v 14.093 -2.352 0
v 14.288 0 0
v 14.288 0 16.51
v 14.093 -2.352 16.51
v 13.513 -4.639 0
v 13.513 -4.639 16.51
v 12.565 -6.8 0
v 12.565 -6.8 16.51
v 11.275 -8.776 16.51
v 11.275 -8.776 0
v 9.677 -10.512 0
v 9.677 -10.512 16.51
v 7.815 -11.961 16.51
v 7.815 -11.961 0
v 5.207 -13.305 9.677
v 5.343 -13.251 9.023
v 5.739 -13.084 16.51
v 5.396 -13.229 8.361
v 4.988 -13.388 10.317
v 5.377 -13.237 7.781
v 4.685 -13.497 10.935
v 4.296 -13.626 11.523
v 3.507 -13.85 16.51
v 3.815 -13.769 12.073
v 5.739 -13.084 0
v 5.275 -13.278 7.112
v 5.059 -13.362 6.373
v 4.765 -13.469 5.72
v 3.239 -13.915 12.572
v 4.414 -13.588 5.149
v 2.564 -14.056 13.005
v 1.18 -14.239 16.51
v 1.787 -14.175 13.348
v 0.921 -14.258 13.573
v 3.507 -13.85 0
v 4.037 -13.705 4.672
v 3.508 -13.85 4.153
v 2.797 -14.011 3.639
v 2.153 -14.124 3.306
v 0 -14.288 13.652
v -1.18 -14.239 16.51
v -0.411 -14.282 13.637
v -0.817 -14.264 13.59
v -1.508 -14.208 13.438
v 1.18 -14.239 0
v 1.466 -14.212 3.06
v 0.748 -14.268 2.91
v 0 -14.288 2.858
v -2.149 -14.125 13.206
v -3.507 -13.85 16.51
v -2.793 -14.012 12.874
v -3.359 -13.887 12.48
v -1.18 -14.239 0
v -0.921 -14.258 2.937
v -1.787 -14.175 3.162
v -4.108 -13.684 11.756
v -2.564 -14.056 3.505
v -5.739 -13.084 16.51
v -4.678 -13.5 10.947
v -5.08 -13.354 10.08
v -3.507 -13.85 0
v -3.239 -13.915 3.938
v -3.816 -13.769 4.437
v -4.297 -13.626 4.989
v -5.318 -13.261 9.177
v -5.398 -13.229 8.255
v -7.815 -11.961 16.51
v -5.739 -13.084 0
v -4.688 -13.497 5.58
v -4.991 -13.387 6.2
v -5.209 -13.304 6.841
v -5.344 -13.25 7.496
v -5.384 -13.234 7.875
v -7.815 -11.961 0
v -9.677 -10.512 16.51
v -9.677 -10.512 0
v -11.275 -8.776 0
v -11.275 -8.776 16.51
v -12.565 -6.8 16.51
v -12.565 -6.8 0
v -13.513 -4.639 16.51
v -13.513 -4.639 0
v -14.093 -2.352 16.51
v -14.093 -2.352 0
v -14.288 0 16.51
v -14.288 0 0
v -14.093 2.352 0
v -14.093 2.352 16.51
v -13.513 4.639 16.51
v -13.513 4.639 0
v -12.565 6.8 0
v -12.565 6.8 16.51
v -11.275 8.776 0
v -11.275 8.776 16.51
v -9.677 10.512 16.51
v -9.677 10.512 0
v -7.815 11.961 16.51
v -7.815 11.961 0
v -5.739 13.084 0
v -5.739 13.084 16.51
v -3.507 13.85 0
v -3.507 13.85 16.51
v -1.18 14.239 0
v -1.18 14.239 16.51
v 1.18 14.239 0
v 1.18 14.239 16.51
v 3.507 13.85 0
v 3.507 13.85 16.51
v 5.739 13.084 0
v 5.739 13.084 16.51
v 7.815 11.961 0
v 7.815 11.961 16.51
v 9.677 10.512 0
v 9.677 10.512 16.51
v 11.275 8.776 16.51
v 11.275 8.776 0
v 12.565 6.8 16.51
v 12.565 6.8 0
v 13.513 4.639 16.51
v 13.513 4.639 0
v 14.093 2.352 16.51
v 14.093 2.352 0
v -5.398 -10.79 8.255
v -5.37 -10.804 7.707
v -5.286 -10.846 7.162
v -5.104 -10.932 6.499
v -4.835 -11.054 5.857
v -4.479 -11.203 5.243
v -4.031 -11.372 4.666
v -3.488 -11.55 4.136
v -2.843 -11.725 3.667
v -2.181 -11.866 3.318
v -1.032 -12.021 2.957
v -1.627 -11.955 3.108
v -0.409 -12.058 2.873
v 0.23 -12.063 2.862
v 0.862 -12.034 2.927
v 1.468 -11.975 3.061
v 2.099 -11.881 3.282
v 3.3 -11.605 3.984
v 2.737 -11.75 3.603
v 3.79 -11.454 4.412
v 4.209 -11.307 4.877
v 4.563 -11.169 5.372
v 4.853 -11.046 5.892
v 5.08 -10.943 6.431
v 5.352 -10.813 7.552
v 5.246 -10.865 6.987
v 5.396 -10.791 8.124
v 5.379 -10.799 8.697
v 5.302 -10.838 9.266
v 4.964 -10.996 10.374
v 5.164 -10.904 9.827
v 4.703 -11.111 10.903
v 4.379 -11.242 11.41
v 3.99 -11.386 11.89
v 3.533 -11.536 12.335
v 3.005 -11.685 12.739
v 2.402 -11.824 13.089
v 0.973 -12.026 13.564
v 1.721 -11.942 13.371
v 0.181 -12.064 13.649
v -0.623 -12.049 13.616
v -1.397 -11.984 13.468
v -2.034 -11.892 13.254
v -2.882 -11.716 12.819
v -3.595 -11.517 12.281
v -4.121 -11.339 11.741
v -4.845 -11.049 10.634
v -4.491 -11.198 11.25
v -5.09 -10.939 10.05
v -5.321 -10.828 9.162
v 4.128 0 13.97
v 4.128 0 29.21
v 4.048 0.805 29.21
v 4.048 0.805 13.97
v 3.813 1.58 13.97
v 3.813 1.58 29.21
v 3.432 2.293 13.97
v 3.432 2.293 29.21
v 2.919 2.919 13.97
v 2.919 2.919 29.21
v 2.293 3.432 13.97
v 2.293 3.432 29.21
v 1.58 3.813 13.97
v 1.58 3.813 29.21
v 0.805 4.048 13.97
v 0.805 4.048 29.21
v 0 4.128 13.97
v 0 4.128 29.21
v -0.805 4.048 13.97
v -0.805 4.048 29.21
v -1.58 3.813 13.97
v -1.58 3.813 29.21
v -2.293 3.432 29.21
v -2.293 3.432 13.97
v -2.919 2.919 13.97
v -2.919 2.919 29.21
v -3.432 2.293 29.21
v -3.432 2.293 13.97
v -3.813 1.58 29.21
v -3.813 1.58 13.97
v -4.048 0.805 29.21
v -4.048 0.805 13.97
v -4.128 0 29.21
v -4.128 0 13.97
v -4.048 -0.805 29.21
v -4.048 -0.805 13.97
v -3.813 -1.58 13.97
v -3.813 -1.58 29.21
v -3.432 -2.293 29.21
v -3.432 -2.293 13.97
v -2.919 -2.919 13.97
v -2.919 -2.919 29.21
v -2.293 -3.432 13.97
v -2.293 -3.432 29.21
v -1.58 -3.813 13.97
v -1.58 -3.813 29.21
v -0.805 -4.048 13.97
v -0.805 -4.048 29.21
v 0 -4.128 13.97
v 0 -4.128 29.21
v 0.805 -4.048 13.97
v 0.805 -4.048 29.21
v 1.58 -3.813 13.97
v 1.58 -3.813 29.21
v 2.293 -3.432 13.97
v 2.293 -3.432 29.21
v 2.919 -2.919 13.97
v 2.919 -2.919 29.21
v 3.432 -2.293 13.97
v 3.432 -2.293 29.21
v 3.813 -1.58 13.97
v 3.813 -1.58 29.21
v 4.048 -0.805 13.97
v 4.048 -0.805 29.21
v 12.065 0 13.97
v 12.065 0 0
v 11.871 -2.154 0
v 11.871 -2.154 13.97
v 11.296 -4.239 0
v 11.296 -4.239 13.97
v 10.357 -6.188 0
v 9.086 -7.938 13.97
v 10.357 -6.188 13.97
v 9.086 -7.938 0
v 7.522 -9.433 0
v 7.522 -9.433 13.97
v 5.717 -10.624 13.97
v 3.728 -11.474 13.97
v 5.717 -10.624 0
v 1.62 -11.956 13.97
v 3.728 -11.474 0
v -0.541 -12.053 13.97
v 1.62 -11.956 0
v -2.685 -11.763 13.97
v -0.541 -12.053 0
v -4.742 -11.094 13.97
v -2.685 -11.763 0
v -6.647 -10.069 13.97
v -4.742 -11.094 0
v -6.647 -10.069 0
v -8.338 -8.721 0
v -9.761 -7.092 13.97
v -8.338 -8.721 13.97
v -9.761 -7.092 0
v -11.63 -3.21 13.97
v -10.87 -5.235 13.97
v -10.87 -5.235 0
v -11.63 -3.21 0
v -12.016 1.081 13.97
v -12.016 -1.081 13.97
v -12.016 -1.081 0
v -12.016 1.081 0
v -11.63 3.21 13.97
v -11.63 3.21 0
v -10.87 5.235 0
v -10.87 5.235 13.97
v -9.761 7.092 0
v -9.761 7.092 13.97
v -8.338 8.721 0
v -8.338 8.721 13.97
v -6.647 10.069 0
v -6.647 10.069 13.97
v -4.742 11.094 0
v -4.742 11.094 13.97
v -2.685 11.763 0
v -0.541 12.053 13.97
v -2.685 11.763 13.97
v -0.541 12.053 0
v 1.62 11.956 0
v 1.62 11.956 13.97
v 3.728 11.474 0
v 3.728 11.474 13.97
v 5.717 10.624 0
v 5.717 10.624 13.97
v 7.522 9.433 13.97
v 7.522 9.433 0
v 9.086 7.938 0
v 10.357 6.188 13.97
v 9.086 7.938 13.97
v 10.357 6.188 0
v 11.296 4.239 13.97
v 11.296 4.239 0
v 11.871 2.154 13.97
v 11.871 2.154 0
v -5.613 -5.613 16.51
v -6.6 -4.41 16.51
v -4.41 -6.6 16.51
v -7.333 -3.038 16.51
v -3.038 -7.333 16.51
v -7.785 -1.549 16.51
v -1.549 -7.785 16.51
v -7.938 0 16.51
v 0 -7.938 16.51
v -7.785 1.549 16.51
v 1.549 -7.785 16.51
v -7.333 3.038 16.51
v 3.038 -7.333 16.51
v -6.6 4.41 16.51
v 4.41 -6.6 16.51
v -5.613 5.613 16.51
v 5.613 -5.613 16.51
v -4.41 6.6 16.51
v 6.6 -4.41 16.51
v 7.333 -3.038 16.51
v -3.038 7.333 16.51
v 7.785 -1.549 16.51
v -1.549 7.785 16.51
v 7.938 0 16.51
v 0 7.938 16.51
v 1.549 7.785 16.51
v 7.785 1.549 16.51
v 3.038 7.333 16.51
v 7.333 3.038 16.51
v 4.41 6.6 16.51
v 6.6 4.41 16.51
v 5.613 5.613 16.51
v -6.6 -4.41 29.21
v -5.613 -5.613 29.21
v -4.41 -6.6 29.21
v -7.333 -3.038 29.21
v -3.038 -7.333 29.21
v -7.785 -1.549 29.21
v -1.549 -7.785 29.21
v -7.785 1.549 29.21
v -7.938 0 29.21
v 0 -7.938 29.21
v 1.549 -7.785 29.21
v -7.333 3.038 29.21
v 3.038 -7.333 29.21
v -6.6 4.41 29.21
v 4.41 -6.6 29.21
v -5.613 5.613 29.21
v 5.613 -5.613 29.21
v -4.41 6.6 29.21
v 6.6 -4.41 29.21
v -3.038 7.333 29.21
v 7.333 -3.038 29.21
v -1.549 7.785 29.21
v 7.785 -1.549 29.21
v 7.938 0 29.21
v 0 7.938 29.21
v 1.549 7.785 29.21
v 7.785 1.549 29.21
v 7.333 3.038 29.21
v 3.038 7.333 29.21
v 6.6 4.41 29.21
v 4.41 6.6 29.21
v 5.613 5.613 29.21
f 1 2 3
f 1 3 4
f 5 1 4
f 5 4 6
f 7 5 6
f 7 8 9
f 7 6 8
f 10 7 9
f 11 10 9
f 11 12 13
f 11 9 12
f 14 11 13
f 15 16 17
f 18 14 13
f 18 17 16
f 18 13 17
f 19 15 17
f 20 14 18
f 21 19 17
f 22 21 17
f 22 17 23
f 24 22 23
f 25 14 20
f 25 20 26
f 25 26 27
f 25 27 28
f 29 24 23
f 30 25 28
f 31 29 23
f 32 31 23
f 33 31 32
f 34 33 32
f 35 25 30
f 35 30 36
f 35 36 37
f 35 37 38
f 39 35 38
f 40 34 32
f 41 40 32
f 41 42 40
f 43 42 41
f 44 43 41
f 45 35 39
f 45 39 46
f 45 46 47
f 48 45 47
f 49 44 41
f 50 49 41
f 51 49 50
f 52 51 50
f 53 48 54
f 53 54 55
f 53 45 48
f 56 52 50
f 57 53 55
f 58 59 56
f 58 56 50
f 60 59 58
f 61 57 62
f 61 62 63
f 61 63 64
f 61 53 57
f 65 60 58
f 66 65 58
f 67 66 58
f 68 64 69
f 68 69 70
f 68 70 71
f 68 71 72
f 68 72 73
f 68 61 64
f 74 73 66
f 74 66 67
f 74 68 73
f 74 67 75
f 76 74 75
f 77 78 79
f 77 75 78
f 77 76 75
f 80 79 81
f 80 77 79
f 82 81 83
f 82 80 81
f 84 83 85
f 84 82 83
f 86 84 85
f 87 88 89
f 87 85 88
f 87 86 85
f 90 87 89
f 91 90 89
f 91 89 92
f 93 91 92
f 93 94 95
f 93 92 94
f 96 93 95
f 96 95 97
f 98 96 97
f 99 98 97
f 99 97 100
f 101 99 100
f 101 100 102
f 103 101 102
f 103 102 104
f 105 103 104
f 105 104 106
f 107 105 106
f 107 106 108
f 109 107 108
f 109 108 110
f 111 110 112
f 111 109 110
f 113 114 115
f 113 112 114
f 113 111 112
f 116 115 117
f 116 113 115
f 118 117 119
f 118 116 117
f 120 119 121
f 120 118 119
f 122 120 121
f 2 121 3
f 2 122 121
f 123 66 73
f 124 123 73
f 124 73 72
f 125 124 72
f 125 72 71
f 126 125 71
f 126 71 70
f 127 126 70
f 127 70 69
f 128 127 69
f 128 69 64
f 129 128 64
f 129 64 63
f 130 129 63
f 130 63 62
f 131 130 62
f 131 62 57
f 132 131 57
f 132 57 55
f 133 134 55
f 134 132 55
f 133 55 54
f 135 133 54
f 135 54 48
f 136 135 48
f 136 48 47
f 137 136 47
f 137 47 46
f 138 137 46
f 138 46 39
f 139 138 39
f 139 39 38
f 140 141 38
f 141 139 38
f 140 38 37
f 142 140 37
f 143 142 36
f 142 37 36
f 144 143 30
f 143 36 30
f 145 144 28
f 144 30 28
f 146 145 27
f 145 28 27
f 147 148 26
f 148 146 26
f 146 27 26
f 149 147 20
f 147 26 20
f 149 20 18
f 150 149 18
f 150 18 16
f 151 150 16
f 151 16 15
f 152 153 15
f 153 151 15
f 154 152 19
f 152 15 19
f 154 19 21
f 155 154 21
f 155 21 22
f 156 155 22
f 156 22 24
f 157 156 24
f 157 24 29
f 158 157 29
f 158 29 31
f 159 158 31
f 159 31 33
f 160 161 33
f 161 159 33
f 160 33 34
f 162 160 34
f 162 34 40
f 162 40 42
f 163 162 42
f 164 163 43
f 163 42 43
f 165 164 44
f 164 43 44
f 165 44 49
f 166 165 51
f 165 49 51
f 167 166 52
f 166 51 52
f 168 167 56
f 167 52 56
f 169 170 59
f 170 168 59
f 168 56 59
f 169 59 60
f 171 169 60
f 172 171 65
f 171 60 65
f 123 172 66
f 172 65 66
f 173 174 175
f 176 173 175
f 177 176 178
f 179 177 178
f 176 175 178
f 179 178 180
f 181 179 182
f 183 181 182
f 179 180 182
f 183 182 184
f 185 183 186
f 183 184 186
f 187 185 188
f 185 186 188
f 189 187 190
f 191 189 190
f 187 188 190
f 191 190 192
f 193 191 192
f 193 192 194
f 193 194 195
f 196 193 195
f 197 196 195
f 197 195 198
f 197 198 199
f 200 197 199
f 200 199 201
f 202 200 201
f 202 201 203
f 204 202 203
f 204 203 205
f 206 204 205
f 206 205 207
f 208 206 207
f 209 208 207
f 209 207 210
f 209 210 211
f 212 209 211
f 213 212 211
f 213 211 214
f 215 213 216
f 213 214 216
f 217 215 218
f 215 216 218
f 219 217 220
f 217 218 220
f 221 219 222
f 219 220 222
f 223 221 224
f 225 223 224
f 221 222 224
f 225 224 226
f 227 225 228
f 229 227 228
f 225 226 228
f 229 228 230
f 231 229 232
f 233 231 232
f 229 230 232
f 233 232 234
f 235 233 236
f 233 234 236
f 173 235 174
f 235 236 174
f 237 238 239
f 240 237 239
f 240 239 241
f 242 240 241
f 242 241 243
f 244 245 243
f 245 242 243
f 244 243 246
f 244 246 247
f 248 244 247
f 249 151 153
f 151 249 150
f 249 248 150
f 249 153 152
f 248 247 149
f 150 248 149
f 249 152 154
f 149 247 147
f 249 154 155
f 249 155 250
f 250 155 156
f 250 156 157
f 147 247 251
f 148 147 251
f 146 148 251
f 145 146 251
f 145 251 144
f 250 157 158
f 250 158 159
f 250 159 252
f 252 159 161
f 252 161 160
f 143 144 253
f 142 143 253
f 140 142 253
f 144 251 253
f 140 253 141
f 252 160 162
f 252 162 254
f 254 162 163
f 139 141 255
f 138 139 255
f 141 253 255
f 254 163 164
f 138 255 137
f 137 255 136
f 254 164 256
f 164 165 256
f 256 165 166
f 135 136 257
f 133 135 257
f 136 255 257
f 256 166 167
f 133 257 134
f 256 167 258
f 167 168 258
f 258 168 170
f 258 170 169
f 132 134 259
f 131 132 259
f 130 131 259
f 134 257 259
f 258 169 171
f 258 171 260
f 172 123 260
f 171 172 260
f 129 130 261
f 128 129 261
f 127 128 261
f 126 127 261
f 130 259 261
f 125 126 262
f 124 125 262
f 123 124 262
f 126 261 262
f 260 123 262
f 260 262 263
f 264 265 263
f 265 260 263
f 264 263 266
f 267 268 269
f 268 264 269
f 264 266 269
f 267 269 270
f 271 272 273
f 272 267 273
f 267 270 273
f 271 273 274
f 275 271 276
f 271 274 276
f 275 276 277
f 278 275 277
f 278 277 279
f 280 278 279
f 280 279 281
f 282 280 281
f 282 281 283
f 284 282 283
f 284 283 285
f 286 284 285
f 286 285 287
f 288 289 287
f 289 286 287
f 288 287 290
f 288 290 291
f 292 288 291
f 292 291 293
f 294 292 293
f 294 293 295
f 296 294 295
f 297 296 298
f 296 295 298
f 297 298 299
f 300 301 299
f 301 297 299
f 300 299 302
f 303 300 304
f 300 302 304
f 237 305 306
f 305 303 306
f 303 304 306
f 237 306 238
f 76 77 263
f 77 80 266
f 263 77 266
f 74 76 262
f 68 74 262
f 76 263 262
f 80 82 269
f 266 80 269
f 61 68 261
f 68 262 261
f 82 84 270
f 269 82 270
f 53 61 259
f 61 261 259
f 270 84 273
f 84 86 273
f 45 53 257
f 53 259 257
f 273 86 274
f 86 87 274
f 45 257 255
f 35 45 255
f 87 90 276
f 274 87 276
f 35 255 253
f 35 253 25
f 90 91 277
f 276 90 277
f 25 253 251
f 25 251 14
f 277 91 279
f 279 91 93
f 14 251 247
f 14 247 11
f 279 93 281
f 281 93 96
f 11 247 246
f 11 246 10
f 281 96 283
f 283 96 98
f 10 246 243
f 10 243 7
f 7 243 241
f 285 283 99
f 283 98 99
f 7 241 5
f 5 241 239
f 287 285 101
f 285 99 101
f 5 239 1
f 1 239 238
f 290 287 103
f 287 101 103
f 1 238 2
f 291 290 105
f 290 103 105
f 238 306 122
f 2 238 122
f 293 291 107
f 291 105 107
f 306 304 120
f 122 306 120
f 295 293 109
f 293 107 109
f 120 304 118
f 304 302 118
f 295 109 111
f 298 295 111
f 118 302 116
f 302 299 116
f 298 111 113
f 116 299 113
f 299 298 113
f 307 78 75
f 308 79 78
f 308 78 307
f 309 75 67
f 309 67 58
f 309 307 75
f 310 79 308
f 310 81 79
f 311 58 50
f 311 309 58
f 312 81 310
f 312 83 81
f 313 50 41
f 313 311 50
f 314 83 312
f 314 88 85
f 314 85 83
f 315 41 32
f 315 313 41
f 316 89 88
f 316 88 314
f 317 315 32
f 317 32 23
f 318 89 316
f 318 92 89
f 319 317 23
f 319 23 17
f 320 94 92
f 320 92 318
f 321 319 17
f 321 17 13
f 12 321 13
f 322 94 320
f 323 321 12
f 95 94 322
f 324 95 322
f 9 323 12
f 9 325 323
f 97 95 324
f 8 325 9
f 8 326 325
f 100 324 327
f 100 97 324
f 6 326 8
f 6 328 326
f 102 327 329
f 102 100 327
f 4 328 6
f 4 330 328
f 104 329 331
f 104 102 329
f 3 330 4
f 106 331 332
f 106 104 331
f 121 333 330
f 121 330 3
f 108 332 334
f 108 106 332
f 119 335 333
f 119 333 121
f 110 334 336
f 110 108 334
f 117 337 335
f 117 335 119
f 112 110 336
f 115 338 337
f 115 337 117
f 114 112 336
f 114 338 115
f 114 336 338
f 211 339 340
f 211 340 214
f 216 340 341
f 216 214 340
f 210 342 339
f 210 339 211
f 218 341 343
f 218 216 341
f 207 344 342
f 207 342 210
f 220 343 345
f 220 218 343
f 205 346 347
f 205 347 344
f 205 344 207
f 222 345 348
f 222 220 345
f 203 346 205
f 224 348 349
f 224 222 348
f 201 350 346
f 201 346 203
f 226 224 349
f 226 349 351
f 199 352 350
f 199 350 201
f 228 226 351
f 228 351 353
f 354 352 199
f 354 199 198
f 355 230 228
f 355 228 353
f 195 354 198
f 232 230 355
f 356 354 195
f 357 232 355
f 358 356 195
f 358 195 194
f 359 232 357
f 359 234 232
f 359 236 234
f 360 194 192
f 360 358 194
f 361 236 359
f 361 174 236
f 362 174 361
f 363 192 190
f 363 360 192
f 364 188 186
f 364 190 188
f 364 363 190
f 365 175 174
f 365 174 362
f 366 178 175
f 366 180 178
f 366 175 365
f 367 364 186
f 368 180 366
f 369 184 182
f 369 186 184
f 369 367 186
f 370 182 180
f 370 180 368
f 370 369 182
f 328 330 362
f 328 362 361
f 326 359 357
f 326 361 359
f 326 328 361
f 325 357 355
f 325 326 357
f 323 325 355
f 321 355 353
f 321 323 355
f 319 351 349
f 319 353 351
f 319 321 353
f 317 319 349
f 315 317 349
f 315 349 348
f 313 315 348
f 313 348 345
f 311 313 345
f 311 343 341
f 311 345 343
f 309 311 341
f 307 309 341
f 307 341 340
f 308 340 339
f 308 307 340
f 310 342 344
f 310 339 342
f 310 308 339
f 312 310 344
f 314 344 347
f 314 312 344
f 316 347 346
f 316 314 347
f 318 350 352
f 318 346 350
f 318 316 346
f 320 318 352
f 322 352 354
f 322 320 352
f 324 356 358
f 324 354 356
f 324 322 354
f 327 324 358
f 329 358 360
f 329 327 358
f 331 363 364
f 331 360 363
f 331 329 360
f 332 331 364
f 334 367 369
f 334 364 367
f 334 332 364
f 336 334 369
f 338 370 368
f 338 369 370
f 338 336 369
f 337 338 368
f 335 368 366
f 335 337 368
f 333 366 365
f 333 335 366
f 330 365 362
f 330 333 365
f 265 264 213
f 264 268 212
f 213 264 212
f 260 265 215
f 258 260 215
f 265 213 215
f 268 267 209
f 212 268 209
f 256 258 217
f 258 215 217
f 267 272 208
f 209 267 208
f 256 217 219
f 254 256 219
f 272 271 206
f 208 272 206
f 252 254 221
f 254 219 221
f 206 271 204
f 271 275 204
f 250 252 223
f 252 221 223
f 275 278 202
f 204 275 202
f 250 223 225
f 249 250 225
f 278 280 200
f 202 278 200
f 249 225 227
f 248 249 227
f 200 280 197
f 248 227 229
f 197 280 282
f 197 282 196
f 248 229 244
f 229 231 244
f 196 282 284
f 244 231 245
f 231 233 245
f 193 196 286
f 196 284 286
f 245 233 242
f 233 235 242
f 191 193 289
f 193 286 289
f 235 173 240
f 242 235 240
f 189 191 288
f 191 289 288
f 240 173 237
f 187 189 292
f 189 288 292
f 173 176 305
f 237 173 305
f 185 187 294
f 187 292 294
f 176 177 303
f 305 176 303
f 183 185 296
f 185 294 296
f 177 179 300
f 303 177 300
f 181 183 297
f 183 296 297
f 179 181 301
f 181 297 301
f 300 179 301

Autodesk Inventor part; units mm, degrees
ref_plane "YZ Plane" through (0, 0, 0) normal (1, 0, 0) x (0, 1, 0)
ref_plane "XY Plane" through (0, 0, 0) normal (0, 0, 1) x (1, 0, 0)
sketch "Sketch1" plane through (0, 0, 0) normal (0, 0, 1) x (1, 0, 0)
  circle A0 centre (0, 0) radius 14.2875
  circle A1 centre (0, 0) radius 12.065
  dimension "d0" = 28.575
  dimension "d1" = 24.13
extrude "Extrusion1" add sketch "Sketch1" along normal blind 13.97
sketch "Sketch2" plane through (0, 0, 13.97) normal (0, 0, 1) x (1, 0, 0)
  circle A0 centre (0, 0) radius 14.2875 projected
  circle A1 centre (0, 0) radius 14.2875
extrude "Extrusion2" add sketch "Sketch2" along normal blind 2.54
sketch "Sketch3" plane through (0, 0, 16.51) normal (0, 0, 1) x (1, 0, 0)
  circle A0 centre (0, 0) radius 14.2875 projected
  circle A1 centre (0, 0) radius 7.9375
  dimension "d6" = 15.875
extrude "Extrusion3" add sketch "Sketch3" along normal blind 12.7 contours A1
thread "Thread1" size "5/8-11 UNC" class "2A" standard "ANSI Unified Screw Threads" full length
ref_plane "Work Plane1" through (0, -14.2875, 0) normal (0, 1, 0) x (-1, 0, 0)
sketch "Sketch4" plane through (0, -14.2875, 0) normal (0, 1, 0) x (-1, 0, 0)
  line L0 (-14.2875, 16.51) -> (14.2875, 16.51) projected
  line L1 (-14.2875, 0) -> (14.2875, 0) projected
  circle A0 centre (0, 8.255) radius 5.3975
  point P0 (0, 0)
  dimension "d12" = 10.795
  dimension "d13" = 8.255
extrude "Extrusion4" cut sketch "Sketch4" along normal blind 12.7
sketch "Sketch5" plane through (0, 0, 29.21) normal (0, 0, 1) x (1, 0, 0)
  circle A0 centre (0, 0) radius 7.9375 projected
  circle A1 centre (0, 0) radius 4.1275
  dimension "d16" = 8.255
extrude "Extrusion5" cut sketch "Sketch5" against normal through all contours A1
properties part number "1in Actuator Top Cap 1764"
